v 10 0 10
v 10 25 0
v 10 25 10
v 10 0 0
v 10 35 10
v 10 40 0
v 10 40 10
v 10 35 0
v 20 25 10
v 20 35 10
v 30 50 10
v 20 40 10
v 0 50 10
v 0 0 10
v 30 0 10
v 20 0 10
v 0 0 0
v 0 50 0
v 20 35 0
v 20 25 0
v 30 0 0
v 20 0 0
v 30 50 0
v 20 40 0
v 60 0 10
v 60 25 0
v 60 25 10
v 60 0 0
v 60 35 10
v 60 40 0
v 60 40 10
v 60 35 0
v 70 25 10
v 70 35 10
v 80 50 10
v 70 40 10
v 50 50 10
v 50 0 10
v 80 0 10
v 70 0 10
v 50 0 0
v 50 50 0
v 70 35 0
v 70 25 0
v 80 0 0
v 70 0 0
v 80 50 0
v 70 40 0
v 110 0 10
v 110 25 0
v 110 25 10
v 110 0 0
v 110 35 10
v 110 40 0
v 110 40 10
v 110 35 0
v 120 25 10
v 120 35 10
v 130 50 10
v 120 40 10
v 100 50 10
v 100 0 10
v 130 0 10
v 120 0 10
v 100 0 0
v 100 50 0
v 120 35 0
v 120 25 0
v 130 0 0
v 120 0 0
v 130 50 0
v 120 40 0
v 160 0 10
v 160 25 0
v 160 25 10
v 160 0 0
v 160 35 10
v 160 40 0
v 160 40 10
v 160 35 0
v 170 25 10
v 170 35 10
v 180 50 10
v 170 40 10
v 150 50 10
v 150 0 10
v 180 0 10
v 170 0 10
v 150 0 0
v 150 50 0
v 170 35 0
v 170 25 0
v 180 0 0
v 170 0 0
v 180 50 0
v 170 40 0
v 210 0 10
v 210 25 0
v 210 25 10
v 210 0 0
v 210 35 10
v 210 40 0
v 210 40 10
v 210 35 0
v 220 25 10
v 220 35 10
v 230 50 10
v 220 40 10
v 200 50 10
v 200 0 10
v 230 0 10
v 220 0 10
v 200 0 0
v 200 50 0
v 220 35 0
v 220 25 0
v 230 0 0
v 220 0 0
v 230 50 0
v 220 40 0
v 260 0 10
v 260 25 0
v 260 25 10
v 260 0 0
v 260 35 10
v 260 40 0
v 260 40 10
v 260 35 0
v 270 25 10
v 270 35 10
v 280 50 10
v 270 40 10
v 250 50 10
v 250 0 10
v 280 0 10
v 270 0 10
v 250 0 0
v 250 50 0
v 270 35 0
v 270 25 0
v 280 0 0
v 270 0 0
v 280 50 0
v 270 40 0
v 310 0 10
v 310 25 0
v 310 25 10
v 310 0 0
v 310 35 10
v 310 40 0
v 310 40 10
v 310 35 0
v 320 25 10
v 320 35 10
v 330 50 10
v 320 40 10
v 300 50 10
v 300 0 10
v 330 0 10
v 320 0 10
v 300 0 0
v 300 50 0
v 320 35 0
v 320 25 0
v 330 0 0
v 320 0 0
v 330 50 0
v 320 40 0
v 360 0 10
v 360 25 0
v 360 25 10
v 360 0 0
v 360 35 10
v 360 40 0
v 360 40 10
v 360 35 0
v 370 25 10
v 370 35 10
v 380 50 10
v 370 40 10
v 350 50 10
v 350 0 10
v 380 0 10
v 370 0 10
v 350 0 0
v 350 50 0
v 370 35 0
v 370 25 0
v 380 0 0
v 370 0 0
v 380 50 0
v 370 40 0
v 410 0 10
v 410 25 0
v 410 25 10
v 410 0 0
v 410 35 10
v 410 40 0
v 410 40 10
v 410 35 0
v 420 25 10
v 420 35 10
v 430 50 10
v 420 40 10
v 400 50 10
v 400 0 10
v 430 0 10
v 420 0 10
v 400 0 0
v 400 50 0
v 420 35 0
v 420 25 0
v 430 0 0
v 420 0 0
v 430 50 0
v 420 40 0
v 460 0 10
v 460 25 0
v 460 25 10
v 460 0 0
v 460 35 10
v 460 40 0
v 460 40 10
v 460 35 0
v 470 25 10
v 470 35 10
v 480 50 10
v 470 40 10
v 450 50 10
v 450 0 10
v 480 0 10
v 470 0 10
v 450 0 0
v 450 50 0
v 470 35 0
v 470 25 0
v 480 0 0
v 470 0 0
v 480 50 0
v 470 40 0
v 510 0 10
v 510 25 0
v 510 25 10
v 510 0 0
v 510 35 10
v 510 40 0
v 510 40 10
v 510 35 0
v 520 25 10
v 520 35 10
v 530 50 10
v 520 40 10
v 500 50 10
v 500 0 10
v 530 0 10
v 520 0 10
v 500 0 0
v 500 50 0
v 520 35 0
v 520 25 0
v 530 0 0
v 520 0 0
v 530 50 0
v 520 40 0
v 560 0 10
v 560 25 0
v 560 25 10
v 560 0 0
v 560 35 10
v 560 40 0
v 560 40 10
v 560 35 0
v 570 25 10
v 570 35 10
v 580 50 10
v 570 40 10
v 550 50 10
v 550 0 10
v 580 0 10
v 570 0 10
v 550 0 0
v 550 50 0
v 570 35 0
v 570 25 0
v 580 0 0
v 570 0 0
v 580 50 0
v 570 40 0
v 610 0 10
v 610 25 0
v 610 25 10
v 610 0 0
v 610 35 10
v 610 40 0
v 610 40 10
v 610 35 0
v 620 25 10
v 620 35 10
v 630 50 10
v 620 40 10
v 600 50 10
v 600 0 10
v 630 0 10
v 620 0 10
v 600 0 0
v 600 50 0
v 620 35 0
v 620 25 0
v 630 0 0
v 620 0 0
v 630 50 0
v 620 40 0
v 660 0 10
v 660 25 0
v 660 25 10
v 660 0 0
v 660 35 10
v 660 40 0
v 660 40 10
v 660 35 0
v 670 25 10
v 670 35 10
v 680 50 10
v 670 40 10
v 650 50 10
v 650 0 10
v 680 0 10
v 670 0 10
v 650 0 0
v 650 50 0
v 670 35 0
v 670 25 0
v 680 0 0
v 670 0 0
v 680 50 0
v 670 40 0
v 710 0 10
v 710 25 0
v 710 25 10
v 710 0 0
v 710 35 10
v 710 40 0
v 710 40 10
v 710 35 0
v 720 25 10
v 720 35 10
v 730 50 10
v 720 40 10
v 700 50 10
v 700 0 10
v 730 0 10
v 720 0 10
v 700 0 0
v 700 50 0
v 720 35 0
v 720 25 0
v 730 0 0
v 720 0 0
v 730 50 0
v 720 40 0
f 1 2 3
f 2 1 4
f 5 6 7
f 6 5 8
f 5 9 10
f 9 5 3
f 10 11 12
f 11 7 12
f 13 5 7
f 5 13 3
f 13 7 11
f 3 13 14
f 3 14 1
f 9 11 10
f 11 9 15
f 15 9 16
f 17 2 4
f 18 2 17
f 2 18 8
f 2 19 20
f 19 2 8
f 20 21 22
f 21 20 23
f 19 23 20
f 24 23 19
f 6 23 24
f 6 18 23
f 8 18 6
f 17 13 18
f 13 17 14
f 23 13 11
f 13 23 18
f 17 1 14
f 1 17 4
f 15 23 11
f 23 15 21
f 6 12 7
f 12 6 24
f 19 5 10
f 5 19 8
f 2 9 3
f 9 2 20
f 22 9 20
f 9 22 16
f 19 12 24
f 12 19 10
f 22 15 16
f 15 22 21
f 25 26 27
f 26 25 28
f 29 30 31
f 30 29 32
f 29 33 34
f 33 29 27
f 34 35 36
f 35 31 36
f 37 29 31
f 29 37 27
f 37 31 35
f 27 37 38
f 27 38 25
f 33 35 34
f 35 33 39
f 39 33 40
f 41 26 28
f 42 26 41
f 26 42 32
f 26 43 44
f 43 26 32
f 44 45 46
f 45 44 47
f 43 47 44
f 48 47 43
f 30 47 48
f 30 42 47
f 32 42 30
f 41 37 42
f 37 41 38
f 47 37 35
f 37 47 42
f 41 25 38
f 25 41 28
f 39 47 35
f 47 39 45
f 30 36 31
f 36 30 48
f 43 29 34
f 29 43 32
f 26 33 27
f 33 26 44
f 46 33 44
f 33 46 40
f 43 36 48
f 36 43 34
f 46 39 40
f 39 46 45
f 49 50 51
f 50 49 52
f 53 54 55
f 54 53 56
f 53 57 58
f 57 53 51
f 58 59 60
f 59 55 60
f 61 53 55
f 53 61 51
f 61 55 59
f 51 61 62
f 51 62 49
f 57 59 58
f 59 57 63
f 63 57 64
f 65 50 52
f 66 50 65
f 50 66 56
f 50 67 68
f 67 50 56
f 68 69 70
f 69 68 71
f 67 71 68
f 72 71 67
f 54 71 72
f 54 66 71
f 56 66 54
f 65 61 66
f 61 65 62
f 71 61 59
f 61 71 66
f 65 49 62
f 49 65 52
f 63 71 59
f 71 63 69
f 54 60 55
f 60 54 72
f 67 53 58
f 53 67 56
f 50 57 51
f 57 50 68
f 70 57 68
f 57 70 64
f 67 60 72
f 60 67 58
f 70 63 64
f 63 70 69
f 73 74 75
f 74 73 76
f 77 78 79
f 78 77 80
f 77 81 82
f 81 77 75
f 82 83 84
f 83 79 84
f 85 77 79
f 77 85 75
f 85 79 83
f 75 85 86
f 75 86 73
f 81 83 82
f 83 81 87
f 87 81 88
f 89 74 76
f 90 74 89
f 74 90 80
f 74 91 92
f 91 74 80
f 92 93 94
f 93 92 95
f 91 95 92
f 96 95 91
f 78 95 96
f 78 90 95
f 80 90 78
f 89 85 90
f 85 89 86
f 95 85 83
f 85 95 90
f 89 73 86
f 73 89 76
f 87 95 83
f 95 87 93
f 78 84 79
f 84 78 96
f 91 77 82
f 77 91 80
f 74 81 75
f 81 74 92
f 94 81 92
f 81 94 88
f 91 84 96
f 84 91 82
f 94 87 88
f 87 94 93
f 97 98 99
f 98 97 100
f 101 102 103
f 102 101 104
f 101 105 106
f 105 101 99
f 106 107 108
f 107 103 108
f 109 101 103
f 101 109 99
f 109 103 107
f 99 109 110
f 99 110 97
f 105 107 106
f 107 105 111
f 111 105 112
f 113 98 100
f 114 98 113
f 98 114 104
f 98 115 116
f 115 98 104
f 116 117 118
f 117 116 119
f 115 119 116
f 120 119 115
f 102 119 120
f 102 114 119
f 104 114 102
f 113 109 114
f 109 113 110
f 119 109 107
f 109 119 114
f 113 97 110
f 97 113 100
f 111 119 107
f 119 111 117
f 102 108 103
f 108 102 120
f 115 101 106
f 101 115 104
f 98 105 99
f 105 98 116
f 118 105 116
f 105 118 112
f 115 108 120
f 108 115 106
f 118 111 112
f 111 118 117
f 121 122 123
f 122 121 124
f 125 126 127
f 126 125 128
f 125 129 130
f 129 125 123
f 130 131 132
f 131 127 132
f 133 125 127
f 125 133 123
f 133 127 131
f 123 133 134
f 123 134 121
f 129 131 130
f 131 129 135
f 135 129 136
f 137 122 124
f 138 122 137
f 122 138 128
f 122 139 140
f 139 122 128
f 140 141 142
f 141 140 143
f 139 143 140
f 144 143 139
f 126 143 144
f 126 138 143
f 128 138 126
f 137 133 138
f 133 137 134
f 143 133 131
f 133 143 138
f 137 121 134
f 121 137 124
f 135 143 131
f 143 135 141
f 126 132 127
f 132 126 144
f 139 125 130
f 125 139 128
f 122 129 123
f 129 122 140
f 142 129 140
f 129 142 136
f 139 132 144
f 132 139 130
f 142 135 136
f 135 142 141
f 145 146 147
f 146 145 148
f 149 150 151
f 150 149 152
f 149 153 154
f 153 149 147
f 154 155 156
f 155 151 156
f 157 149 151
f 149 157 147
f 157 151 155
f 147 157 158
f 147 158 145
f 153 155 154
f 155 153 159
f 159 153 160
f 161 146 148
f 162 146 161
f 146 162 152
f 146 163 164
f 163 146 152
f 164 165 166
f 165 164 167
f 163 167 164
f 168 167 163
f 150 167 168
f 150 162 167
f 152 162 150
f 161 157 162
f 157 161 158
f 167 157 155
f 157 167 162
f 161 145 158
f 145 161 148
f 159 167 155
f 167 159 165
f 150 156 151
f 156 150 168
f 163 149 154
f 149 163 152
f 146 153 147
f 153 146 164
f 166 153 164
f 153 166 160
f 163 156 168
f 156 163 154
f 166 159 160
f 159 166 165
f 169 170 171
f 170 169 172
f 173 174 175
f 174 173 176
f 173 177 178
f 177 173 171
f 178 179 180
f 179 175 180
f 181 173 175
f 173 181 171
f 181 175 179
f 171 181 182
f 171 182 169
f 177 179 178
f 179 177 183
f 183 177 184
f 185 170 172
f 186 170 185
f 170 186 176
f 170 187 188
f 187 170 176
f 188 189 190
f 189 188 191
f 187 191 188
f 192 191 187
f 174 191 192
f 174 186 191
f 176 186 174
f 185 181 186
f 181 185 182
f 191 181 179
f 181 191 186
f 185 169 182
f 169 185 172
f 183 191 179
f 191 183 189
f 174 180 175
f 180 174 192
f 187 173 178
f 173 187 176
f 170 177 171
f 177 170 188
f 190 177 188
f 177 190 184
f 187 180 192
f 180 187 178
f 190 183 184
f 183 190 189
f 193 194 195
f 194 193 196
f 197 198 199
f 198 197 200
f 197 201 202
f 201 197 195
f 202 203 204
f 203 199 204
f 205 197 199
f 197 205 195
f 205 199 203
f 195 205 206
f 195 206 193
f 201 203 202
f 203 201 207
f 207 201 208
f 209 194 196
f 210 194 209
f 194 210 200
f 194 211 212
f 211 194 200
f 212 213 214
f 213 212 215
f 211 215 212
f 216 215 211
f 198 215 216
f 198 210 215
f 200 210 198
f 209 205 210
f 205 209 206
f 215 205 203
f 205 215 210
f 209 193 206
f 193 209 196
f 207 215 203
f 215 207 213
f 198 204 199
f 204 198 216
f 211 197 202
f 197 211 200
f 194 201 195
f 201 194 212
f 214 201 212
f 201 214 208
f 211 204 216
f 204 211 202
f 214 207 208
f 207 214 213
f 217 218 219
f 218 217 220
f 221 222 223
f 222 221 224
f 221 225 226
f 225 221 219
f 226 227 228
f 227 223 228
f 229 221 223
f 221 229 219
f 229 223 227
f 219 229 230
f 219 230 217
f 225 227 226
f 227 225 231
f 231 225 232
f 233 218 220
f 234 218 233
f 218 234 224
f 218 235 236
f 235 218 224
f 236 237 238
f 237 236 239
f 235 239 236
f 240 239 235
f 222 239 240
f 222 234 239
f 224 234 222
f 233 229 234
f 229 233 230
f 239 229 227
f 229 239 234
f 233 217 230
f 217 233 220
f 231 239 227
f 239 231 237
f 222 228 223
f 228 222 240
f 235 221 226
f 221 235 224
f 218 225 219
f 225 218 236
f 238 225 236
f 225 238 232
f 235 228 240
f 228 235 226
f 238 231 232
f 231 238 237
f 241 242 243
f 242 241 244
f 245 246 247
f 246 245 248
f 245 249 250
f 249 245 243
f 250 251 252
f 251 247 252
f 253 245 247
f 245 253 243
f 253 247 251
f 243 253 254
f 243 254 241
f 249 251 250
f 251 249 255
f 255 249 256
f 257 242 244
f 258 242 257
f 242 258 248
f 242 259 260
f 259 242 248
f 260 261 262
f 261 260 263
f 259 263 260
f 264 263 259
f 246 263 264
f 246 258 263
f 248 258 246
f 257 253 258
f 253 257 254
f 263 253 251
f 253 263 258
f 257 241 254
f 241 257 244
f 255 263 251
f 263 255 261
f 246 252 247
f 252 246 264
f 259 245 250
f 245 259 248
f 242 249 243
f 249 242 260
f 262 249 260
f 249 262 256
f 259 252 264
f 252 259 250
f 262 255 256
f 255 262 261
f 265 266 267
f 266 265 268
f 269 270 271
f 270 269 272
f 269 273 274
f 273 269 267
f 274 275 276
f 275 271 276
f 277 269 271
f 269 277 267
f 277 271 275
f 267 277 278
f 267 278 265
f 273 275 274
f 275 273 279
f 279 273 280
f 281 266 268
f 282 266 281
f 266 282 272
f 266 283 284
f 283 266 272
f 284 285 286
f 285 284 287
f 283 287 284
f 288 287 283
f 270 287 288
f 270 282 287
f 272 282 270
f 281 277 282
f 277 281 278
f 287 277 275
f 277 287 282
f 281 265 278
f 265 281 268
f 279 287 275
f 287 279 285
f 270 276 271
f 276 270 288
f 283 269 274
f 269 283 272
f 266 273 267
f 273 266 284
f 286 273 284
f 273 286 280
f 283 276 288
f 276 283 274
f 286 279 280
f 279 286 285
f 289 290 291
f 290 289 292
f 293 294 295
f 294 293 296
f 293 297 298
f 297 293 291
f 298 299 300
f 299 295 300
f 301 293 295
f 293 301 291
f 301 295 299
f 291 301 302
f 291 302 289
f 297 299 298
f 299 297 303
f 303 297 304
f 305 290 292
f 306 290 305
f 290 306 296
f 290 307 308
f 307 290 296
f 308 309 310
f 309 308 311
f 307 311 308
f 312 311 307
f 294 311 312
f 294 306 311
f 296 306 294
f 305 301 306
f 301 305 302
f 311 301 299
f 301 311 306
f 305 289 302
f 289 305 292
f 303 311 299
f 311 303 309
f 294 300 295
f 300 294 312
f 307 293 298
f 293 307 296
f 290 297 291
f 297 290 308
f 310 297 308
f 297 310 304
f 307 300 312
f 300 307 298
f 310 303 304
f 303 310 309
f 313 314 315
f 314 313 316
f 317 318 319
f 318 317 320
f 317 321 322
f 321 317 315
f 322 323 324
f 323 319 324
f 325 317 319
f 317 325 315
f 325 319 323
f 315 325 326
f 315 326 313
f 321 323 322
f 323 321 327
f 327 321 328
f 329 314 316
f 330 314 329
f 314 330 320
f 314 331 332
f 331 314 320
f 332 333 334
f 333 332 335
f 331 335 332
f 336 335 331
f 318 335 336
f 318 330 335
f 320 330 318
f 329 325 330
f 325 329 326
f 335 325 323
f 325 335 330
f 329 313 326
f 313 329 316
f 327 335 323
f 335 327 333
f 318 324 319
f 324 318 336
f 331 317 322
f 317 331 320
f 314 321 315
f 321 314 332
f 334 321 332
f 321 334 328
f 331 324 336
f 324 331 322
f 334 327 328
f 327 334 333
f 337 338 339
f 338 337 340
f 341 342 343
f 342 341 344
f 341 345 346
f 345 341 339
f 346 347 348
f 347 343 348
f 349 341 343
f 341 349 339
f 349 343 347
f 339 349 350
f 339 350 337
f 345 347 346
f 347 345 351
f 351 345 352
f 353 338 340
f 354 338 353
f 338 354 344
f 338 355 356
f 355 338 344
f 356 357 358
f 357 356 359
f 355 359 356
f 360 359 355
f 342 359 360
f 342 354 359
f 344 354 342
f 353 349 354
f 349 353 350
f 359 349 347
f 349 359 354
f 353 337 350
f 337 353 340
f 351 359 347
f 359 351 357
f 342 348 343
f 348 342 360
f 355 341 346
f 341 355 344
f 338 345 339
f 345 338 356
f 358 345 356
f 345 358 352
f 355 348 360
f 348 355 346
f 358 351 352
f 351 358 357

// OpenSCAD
union(){
    translate(v=[0, 0, 0]){
        color("red"){
            union(){
                cube(size=[10, 50, 10]);
                translate(v=[0, 40, 0]){
                    cube(size=[30, 10, 10]);
                };
                translate(v=[0, 25, 0]){
                    cube(size=[30, 10, 10]);
                };
                translate(v=[20, 0, 0]){
                    cube(size=[10, 50, 10]);
                };
            };
        };
    };
    translate(v=[50, 0, 0]){
        color("blue"){
            union(){
                cube(size=[10, 50, 10]);
                translate(v=[0, 40, 0]){
                    cube(size=[30, 10, 10]);
                };
                translate(v=[0, 25, 0]){
                    cube(size=[30, 10, 10]);
                };
                translate(v=[20, 0, 0]){
                    cube(size=[10, 50, 10]);
                };
            };
        };
    };
    translate(v=[100, 0, 0]){
        color("red"){
            union(){
                cube(size=[10, 50, 10]);
                translate(v=[0, 40, 0]){
                    cube(size=[30, 10, 10]);
                };
                translate(v=[0, 25, 0]){
                    cube(size=[30, 10, 10]);
                };
                translate(v=[20, 0, 0]){
                    cube(size=[10, 50, 10]);
                };
            };
        };
    };
    translate(v=[150, 0, 0]){
        color("blue"){
            union(){
                cube(size=[10, 50, 10]);
                translate(v=[0, 40, 0]){
                    cube(size=[30, 10, 10]);
                };
                translate(v=[0, 25, 0]){
                    cube(size=[30, 10, 10]);
                };
                translate(v=[20, 0, 0]){
                    cube(size=[10, 50, 10]);
                };
            };
        };
    };
    translate(v=[200, 0, 0]){
        color("red"){
            union(){
                cube(size=[10, 50, 10]);
                translate(v=[0, 40, 0]){
                    cube(size=[30, 10, 10]);
                };
                translate(v=[0, 25, 0]){
                    cube(size=[30, 10, 10]);
                };
                translate(v=[20, 0, 0]){
                    cube(size=[10, 50, 10]);
                };
            };
        };
    };
    translate(v=[250, 0, 0]){
        color("blue"){
            union(){
                cube(size=[10, 50, 10]);
                translate(v=[0, 40, 0]){
                    cube(size=[30, 10, 10]);
                };
                translate(v=[0, 25, 0]){
                    cube(size=[30, 10, 10]);
                };
                translate(v=[20, 0, 0]){
                    cube(size=[10, 50, 10]);
                };
            };
        };
    };
    translate(v=[300, 0, 0]){
        color("red"){
            union(){
                cube(size=[10, 50, 10]);
                translate(v=[0, 40, 0]){
                    cube(size=[30, 10, 10]);
                };
                translate(v=[0, 25, 0]){
                    cube(size=[30, 10, 10]);
                };
                translate(v=[20, 0, 0]){
                    cube(size=[10, 50, 10]);
                };
            };
        };
    };
    translate(v=[350, 0, 0]){
        color("blue"){
            union(){
                cube(size=[10, 50, 10]);
                translate(v=[0, 40, 0]){
                    cube(size=[30, 10, 10]);
                };
                translate(v=[0, 25, 0]){
                    cube(size=[30, 10, 10]);
                };
                translate(v=[20, 0, 0]){
                    cube(size=[10, 50, 10]);
                };
            };
        };
    };
    translate(v=[400, 0, 0]){
        color("red"){
            union(){
                cube(size=[10, 50, 10]);
                translate(v=[0, 40, 0]){
                    cube(size=[30, 10, 10]);
                };
                translate(v=[0, 25, 0]){
                    cube(size=[30, 10, 10]);
                };
                translate(v=[20, 0, 0]){
                    cube(size=[10, 50, 10]);
                };
            };
        };
    };
    translate(v=[450, 0, 0]){
        color("blue"){
            union(){
                cube(size=[10, 50, 10]);
                translate(v=[0, 40, 0]){
                    cube(size=[30, 10, 10]);
                };
                translate(v=[0, 25, 0]){
                    cube(size=[30, 10, 10]);
                };
                translate(v=[20, 0, 0]){
                    cube(size=[10, 50, 10]);
                };
            };
        };
    };
    translate(v=[500, 0, 0]){
        color("red"){
            union(){
                cube(size=[10, 50, 10]);
                translate(v=[0, 40, 0]){
                    cube(size=[30, 10, 10]);
                };
                translate(v=[0, 25, 0]){
                    cube(size=[30, 10, 10]);
                };
                translate(v=[20, 0, 0]){
                    cube(size=[10, 50, 10]);
                };
            };
        };
    };
    translate(v=[550, 0, 0]){
        color("blue"){
            union(){
                cube(size=[10, 50, 10]);
                translate(v=[0, 40, 0]){
                    cube(size=[30, 10, 10]);
                };
                translate(v=[0, 25, 0]){
                    cube(size=[30, 10, 10]);
                };
                translate(v=[20, 0, 0]){
                    cube(size=[10, 50, 10]);
                };
            };
        };
    };
    translate(v=[600, 0, 0]){
        color("red"){
            union(){
                cube(size=[10, 50, 10]);
                translate(v=[0, 40, 0]){
                    cube(size=[30, 10, 10]);
                };
                translate(v=[0, 25, 0]){
                    cube(size=[30, 10, 10]);
                };
                translate(v=[20, 0, 0]){
                    cube(size=[10, 50, 10]);
                };
            };
        };
    };
    translate(v=[650, 0, 0]){
        color("blue"){
            union(){
                cube(size=[10, 50, 10]);
                translate(v=[0, 40, 0]){
                    cube(size=[30, 10, 10]);
                };
                translate(v=[0, 25, 0]){
                    cube(size=[30, 10, 10]);
                };
                translate(v=[20, 0, 0]){
                    cube(size=[10, 50, 10]);
                };
            };
        };
    };
    translate(v=[700, 0, 0]){
        color("red"){
            union(){
                cube(size=[10, 50, 10]);
                translate(v=[0, 40, 0]){
                    cube(size=[30, 10, 10]);
                };
                translate(v=[0, 25, 0]){
                    cube(size=[30, 10, 10]);
                };
                translate(v=[20, 0, 0]){
                    cube(size=[10, 50, 10]);
                };
            };
        };
    };
};
